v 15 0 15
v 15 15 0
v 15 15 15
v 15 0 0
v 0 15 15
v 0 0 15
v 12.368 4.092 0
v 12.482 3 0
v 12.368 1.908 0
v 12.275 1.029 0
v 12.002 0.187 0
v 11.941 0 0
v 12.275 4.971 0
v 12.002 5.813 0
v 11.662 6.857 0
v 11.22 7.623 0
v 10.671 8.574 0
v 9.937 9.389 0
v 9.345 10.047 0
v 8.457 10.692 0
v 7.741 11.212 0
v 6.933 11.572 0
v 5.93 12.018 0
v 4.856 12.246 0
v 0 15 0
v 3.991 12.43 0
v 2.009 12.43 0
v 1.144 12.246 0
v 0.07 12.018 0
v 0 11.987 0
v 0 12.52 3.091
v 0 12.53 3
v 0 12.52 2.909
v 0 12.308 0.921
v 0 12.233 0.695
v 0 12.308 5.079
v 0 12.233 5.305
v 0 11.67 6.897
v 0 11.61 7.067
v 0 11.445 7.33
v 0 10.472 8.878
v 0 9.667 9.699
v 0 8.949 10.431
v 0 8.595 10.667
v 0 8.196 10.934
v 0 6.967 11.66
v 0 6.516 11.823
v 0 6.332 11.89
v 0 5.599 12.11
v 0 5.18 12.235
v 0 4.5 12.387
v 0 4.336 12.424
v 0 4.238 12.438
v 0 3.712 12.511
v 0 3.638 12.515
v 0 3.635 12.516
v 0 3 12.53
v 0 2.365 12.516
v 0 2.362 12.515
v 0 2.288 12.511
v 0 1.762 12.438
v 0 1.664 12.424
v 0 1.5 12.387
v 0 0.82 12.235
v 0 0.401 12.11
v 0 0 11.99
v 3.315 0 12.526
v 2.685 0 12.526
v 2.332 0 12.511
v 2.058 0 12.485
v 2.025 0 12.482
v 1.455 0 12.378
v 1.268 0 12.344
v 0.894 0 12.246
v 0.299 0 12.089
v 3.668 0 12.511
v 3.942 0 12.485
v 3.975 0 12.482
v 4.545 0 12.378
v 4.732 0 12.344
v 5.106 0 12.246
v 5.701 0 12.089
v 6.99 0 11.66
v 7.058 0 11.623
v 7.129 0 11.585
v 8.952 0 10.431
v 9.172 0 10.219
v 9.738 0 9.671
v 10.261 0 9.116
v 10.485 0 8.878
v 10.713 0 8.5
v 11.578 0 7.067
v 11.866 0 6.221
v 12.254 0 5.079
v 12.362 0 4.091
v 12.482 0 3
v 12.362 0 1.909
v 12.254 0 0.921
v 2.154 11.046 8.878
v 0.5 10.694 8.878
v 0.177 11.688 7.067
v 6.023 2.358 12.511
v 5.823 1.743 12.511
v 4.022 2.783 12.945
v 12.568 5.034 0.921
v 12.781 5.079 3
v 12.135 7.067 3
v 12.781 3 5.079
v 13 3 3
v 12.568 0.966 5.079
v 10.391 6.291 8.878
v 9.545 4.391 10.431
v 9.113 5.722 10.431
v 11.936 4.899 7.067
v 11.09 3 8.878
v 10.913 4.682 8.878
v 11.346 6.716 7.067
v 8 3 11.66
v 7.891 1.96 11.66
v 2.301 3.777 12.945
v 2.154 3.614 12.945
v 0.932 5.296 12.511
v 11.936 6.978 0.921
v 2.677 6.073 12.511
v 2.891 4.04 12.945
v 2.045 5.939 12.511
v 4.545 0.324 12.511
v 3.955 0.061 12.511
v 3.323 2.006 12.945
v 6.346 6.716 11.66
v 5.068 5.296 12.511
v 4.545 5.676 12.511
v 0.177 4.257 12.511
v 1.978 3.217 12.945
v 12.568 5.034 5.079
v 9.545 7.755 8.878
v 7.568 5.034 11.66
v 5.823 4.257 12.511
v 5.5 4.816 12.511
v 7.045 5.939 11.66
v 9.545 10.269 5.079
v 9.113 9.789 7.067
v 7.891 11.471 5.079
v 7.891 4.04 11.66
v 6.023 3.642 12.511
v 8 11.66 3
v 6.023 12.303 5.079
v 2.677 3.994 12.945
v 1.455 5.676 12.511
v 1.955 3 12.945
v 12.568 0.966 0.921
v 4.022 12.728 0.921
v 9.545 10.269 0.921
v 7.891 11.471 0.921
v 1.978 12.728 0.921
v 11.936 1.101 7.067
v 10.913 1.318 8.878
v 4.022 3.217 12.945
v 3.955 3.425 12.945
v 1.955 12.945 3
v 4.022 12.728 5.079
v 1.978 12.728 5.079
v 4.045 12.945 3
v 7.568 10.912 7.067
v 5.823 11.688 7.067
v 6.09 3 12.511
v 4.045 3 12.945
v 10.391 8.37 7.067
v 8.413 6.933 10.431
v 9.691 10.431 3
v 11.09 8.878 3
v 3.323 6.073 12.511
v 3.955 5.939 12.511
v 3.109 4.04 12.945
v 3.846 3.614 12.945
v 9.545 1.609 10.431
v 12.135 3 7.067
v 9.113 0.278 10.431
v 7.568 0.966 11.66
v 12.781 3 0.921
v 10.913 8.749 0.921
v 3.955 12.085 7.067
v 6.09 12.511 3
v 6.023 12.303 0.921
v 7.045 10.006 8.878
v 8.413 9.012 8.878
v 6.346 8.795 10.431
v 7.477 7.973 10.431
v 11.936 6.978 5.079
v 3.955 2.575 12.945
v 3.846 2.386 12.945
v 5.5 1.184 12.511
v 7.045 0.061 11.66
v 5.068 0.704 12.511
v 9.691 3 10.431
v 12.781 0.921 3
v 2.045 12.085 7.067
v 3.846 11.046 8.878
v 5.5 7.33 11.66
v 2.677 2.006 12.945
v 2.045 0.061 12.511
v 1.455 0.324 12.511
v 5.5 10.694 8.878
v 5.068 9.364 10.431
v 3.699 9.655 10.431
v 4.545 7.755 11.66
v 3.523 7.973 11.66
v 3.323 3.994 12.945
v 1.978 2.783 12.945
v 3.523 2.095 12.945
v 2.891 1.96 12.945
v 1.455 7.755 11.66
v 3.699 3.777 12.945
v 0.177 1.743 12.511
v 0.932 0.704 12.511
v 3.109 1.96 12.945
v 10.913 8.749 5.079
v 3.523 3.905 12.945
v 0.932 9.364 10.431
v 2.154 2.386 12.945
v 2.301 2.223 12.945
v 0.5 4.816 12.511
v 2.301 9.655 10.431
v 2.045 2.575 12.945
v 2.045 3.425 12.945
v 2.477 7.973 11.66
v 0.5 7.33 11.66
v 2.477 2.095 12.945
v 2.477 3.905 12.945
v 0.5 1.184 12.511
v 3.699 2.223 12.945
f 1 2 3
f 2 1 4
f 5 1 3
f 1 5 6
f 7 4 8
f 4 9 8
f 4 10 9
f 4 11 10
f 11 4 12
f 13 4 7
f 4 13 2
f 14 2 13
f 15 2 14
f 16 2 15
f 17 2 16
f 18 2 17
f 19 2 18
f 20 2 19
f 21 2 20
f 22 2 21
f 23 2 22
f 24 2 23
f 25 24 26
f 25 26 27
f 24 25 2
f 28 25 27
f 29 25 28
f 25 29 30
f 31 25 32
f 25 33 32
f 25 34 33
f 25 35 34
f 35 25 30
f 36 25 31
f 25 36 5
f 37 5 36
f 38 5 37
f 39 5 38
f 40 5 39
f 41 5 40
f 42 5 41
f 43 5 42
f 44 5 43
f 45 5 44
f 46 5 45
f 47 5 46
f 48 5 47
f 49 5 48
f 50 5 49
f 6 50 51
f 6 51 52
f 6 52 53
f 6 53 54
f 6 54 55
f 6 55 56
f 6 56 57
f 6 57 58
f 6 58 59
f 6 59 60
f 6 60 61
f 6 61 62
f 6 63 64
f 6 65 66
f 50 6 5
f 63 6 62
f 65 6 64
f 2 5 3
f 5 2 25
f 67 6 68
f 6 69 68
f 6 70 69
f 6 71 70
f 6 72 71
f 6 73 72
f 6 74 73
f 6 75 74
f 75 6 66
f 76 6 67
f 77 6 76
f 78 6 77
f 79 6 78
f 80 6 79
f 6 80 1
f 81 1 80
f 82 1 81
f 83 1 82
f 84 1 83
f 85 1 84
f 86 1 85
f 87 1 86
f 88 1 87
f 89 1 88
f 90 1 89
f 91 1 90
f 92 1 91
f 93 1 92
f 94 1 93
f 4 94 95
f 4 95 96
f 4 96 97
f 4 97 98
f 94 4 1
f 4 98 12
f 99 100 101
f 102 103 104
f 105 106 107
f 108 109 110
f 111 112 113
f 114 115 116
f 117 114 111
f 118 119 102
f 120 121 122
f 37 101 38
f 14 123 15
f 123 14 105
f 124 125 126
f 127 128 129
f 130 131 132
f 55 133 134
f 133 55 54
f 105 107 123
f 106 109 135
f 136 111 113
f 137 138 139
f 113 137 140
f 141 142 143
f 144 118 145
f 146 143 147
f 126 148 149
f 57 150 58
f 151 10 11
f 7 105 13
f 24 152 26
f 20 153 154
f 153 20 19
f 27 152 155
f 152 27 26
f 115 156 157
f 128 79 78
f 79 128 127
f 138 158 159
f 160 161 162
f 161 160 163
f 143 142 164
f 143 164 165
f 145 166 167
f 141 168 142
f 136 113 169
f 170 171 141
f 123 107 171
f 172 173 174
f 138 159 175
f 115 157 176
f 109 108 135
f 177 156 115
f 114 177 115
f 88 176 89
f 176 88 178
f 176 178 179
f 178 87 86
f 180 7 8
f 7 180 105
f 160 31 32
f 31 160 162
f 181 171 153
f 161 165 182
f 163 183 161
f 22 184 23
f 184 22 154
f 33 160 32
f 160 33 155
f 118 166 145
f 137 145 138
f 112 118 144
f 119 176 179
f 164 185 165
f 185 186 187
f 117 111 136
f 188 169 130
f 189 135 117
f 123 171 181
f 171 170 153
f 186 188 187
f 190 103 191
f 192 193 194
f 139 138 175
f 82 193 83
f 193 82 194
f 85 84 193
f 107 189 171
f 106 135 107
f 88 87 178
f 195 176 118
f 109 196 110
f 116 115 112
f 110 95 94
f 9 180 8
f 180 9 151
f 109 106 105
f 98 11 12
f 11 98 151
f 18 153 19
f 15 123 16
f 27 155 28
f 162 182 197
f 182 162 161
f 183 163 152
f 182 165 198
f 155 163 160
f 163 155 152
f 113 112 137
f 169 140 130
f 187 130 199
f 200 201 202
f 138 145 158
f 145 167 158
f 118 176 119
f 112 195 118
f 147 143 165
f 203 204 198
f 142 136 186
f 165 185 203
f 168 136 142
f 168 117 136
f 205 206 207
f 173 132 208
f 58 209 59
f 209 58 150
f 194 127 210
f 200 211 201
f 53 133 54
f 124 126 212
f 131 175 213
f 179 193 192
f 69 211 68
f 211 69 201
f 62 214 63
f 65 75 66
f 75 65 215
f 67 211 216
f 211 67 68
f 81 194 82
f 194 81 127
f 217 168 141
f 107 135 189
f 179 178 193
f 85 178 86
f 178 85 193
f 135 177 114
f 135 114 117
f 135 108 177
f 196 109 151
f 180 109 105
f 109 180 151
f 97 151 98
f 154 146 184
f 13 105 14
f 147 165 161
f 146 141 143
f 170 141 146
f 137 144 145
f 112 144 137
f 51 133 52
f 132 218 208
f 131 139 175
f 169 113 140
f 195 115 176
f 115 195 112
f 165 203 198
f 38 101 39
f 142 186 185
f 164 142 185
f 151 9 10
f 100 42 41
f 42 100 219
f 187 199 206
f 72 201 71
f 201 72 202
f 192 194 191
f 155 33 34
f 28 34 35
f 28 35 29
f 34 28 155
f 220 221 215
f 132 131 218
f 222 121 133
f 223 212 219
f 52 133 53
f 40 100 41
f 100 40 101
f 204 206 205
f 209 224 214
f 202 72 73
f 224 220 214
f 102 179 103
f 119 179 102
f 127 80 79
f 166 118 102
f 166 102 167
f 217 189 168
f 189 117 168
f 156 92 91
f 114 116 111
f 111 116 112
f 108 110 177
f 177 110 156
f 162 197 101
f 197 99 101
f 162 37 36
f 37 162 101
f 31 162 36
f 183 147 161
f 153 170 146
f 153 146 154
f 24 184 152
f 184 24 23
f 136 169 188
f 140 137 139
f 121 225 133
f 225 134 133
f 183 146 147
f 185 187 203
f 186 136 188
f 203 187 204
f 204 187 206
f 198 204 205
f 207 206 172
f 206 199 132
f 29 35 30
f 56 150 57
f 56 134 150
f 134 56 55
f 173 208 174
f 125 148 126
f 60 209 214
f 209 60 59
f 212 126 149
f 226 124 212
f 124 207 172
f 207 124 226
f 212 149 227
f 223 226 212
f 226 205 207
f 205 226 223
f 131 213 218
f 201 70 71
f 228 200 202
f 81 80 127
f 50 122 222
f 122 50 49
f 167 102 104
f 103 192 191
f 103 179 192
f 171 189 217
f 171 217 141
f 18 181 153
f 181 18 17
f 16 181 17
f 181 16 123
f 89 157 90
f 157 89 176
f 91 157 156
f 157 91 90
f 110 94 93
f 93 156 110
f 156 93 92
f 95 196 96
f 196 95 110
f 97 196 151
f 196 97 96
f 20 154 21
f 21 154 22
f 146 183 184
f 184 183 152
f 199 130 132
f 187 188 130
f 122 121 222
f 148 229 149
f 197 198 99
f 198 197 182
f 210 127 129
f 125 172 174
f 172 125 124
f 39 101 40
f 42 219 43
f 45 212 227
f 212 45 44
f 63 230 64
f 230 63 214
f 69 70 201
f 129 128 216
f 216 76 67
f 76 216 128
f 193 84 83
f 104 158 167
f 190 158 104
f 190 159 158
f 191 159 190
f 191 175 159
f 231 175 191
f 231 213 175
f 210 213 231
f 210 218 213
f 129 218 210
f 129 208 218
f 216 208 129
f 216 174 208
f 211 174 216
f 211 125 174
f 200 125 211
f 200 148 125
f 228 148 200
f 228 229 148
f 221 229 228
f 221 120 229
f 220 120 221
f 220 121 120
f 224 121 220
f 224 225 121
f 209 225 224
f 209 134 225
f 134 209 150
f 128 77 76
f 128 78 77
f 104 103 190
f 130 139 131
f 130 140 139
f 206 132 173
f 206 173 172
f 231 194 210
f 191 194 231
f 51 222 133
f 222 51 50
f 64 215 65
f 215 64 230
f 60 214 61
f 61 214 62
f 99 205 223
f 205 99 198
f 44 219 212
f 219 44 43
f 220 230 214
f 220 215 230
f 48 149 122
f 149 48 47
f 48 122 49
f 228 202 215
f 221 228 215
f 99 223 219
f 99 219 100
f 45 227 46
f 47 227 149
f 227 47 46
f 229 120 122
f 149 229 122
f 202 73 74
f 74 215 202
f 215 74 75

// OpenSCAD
difference() {
	cube(size=15);
	translate([3, 3, 3]) {
		sphere(r=10);
	}
}
